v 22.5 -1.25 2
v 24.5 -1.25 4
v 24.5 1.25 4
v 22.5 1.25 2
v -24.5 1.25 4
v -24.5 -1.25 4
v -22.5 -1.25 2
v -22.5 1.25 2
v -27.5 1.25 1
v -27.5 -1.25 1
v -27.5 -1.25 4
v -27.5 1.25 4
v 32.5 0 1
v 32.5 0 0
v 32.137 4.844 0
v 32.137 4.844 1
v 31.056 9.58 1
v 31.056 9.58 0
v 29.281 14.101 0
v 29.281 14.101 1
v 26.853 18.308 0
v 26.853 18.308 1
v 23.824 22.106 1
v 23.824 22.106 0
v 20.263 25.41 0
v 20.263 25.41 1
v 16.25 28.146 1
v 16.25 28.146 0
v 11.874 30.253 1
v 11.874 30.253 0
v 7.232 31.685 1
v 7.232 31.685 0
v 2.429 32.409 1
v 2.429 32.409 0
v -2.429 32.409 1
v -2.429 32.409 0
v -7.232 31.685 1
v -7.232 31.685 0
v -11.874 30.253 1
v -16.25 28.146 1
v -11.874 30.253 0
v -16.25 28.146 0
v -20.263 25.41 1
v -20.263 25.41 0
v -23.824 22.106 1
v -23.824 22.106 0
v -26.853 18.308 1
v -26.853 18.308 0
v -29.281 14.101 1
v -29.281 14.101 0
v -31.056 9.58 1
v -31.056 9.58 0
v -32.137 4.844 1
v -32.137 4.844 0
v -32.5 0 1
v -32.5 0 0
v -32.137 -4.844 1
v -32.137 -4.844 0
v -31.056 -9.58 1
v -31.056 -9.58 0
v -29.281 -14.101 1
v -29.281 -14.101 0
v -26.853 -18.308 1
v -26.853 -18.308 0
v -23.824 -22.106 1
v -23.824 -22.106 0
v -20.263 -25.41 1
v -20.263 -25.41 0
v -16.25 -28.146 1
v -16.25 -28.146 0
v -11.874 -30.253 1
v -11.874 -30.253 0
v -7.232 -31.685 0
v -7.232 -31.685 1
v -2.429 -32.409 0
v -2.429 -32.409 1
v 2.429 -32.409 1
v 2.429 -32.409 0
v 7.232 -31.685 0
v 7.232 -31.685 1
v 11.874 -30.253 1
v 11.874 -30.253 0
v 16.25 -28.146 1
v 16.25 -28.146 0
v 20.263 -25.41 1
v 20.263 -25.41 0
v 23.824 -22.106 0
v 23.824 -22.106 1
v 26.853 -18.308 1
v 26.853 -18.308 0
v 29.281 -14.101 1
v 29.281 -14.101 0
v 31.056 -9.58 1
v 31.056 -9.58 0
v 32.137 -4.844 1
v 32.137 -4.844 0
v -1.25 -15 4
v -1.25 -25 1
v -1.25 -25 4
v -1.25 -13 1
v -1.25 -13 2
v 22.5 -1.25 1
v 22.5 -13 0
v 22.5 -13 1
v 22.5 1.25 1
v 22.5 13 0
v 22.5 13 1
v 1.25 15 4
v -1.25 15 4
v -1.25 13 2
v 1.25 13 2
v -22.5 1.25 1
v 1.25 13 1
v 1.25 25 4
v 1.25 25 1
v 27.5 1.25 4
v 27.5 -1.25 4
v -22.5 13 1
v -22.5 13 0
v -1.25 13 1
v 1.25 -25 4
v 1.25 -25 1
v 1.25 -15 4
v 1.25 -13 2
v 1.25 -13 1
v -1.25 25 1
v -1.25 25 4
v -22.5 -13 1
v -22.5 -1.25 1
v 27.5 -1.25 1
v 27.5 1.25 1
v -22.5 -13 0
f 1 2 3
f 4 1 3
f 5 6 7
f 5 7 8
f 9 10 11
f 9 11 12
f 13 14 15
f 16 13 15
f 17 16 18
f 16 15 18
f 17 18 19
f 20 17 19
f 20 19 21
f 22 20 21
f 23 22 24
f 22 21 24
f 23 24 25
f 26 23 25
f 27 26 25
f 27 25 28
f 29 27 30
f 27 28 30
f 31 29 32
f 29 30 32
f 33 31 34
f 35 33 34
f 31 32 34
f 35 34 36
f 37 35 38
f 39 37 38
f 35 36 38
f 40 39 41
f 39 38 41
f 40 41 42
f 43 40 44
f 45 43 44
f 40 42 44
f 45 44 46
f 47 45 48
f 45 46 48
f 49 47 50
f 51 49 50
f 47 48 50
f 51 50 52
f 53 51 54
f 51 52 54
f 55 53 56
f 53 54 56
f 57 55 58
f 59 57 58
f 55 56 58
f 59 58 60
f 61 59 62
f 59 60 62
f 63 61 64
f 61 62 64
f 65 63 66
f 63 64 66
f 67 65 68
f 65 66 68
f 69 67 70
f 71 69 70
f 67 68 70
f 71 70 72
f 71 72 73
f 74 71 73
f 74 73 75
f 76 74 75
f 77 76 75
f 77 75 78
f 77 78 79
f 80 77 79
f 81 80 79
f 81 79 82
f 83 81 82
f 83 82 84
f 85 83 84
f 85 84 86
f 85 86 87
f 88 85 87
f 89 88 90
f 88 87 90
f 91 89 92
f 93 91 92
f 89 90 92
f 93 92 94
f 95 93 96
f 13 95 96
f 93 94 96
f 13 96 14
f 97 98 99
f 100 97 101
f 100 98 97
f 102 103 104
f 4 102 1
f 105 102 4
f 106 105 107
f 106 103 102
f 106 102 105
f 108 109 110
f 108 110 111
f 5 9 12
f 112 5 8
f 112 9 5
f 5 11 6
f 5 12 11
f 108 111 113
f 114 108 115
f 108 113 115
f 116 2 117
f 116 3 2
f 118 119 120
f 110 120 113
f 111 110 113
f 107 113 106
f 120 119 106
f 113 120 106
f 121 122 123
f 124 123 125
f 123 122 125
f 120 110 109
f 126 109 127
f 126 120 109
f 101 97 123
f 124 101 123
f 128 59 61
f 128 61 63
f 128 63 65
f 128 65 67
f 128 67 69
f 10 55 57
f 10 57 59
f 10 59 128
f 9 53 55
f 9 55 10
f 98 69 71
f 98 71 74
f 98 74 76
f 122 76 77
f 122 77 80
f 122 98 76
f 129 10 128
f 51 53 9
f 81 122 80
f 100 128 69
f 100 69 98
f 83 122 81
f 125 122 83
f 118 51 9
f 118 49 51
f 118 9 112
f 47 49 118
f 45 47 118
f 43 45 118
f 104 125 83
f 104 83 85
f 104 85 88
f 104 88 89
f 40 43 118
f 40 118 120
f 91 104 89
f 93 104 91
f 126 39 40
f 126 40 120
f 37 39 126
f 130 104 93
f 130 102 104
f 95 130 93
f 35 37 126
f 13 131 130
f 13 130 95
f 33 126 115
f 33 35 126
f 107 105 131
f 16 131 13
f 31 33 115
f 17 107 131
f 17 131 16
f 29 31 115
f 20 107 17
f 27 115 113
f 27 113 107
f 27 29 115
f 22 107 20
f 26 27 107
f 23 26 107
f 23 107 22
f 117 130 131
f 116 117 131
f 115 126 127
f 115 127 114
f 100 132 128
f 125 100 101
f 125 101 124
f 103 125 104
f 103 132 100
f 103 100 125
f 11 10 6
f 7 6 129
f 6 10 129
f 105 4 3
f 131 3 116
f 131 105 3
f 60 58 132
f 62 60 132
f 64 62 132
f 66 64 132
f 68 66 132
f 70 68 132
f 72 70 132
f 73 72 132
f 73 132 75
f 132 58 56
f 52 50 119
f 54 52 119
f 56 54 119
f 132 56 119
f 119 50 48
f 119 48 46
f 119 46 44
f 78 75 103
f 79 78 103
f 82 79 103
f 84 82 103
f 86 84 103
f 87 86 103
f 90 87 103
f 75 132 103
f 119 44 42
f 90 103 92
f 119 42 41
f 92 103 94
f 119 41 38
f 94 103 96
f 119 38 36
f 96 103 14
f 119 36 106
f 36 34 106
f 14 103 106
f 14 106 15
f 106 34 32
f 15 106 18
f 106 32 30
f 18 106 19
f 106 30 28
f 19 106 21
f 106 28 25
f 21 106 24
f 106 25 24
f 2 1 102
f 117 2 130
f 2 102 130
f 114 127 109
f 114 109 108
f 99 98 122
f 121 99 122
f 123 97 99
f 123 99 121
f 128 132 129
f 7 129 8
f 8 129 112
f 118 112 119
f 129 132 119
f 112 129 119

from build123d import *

# Parameters (mm, degrees)
F0_R     = 32.5
F0_W     = 45
F0_H     = 26
F1_DEPTH = 1
F2_W     = 2.5
F2_H     = 12
F2_W_2   = 5
F2_H_2   = 2.5
F3_DEPTH = 3
F4_SIZE  = 2


with BuildPart() as f1:
    # F0 (on Top) → F1 (new body)
    with BuildSketch(Plane.XY):
        Circle(F0_R)
        Rectangle(F0_W, F0_H, mode=Mode.SUBTRACT)
    extrude(amount=F1_DEPTH)

    # F2 (on face) → F3 (join)
    with BuildSketch(Plane.XY.offset(1)):
        with Locations((0, 19)):
            Rectangle(F2_W, F2_H)
        with Locations((0, -19)):
            Rectangle(F2_W, F2_H)
        with Locations((-25, 0)):
            Rectangle(F2_W_2, F2_H_2)
        with Locations((25, 0)):
            Rectangle(F2_W_2, F2_H_2)
    extrude(amount=F3_DEPTH)

    # F4
    f4_edges = [f1.edges().sort_by_distance(p)[0] for p in [
        (-22.5, 0, 4),
        (22.5, 0, 4),
        (0, 13, 4),
        (0, -13, 4),
    ]]
    chamfer(f4_edges, length=F4_SIZE)


solid = f1.part
